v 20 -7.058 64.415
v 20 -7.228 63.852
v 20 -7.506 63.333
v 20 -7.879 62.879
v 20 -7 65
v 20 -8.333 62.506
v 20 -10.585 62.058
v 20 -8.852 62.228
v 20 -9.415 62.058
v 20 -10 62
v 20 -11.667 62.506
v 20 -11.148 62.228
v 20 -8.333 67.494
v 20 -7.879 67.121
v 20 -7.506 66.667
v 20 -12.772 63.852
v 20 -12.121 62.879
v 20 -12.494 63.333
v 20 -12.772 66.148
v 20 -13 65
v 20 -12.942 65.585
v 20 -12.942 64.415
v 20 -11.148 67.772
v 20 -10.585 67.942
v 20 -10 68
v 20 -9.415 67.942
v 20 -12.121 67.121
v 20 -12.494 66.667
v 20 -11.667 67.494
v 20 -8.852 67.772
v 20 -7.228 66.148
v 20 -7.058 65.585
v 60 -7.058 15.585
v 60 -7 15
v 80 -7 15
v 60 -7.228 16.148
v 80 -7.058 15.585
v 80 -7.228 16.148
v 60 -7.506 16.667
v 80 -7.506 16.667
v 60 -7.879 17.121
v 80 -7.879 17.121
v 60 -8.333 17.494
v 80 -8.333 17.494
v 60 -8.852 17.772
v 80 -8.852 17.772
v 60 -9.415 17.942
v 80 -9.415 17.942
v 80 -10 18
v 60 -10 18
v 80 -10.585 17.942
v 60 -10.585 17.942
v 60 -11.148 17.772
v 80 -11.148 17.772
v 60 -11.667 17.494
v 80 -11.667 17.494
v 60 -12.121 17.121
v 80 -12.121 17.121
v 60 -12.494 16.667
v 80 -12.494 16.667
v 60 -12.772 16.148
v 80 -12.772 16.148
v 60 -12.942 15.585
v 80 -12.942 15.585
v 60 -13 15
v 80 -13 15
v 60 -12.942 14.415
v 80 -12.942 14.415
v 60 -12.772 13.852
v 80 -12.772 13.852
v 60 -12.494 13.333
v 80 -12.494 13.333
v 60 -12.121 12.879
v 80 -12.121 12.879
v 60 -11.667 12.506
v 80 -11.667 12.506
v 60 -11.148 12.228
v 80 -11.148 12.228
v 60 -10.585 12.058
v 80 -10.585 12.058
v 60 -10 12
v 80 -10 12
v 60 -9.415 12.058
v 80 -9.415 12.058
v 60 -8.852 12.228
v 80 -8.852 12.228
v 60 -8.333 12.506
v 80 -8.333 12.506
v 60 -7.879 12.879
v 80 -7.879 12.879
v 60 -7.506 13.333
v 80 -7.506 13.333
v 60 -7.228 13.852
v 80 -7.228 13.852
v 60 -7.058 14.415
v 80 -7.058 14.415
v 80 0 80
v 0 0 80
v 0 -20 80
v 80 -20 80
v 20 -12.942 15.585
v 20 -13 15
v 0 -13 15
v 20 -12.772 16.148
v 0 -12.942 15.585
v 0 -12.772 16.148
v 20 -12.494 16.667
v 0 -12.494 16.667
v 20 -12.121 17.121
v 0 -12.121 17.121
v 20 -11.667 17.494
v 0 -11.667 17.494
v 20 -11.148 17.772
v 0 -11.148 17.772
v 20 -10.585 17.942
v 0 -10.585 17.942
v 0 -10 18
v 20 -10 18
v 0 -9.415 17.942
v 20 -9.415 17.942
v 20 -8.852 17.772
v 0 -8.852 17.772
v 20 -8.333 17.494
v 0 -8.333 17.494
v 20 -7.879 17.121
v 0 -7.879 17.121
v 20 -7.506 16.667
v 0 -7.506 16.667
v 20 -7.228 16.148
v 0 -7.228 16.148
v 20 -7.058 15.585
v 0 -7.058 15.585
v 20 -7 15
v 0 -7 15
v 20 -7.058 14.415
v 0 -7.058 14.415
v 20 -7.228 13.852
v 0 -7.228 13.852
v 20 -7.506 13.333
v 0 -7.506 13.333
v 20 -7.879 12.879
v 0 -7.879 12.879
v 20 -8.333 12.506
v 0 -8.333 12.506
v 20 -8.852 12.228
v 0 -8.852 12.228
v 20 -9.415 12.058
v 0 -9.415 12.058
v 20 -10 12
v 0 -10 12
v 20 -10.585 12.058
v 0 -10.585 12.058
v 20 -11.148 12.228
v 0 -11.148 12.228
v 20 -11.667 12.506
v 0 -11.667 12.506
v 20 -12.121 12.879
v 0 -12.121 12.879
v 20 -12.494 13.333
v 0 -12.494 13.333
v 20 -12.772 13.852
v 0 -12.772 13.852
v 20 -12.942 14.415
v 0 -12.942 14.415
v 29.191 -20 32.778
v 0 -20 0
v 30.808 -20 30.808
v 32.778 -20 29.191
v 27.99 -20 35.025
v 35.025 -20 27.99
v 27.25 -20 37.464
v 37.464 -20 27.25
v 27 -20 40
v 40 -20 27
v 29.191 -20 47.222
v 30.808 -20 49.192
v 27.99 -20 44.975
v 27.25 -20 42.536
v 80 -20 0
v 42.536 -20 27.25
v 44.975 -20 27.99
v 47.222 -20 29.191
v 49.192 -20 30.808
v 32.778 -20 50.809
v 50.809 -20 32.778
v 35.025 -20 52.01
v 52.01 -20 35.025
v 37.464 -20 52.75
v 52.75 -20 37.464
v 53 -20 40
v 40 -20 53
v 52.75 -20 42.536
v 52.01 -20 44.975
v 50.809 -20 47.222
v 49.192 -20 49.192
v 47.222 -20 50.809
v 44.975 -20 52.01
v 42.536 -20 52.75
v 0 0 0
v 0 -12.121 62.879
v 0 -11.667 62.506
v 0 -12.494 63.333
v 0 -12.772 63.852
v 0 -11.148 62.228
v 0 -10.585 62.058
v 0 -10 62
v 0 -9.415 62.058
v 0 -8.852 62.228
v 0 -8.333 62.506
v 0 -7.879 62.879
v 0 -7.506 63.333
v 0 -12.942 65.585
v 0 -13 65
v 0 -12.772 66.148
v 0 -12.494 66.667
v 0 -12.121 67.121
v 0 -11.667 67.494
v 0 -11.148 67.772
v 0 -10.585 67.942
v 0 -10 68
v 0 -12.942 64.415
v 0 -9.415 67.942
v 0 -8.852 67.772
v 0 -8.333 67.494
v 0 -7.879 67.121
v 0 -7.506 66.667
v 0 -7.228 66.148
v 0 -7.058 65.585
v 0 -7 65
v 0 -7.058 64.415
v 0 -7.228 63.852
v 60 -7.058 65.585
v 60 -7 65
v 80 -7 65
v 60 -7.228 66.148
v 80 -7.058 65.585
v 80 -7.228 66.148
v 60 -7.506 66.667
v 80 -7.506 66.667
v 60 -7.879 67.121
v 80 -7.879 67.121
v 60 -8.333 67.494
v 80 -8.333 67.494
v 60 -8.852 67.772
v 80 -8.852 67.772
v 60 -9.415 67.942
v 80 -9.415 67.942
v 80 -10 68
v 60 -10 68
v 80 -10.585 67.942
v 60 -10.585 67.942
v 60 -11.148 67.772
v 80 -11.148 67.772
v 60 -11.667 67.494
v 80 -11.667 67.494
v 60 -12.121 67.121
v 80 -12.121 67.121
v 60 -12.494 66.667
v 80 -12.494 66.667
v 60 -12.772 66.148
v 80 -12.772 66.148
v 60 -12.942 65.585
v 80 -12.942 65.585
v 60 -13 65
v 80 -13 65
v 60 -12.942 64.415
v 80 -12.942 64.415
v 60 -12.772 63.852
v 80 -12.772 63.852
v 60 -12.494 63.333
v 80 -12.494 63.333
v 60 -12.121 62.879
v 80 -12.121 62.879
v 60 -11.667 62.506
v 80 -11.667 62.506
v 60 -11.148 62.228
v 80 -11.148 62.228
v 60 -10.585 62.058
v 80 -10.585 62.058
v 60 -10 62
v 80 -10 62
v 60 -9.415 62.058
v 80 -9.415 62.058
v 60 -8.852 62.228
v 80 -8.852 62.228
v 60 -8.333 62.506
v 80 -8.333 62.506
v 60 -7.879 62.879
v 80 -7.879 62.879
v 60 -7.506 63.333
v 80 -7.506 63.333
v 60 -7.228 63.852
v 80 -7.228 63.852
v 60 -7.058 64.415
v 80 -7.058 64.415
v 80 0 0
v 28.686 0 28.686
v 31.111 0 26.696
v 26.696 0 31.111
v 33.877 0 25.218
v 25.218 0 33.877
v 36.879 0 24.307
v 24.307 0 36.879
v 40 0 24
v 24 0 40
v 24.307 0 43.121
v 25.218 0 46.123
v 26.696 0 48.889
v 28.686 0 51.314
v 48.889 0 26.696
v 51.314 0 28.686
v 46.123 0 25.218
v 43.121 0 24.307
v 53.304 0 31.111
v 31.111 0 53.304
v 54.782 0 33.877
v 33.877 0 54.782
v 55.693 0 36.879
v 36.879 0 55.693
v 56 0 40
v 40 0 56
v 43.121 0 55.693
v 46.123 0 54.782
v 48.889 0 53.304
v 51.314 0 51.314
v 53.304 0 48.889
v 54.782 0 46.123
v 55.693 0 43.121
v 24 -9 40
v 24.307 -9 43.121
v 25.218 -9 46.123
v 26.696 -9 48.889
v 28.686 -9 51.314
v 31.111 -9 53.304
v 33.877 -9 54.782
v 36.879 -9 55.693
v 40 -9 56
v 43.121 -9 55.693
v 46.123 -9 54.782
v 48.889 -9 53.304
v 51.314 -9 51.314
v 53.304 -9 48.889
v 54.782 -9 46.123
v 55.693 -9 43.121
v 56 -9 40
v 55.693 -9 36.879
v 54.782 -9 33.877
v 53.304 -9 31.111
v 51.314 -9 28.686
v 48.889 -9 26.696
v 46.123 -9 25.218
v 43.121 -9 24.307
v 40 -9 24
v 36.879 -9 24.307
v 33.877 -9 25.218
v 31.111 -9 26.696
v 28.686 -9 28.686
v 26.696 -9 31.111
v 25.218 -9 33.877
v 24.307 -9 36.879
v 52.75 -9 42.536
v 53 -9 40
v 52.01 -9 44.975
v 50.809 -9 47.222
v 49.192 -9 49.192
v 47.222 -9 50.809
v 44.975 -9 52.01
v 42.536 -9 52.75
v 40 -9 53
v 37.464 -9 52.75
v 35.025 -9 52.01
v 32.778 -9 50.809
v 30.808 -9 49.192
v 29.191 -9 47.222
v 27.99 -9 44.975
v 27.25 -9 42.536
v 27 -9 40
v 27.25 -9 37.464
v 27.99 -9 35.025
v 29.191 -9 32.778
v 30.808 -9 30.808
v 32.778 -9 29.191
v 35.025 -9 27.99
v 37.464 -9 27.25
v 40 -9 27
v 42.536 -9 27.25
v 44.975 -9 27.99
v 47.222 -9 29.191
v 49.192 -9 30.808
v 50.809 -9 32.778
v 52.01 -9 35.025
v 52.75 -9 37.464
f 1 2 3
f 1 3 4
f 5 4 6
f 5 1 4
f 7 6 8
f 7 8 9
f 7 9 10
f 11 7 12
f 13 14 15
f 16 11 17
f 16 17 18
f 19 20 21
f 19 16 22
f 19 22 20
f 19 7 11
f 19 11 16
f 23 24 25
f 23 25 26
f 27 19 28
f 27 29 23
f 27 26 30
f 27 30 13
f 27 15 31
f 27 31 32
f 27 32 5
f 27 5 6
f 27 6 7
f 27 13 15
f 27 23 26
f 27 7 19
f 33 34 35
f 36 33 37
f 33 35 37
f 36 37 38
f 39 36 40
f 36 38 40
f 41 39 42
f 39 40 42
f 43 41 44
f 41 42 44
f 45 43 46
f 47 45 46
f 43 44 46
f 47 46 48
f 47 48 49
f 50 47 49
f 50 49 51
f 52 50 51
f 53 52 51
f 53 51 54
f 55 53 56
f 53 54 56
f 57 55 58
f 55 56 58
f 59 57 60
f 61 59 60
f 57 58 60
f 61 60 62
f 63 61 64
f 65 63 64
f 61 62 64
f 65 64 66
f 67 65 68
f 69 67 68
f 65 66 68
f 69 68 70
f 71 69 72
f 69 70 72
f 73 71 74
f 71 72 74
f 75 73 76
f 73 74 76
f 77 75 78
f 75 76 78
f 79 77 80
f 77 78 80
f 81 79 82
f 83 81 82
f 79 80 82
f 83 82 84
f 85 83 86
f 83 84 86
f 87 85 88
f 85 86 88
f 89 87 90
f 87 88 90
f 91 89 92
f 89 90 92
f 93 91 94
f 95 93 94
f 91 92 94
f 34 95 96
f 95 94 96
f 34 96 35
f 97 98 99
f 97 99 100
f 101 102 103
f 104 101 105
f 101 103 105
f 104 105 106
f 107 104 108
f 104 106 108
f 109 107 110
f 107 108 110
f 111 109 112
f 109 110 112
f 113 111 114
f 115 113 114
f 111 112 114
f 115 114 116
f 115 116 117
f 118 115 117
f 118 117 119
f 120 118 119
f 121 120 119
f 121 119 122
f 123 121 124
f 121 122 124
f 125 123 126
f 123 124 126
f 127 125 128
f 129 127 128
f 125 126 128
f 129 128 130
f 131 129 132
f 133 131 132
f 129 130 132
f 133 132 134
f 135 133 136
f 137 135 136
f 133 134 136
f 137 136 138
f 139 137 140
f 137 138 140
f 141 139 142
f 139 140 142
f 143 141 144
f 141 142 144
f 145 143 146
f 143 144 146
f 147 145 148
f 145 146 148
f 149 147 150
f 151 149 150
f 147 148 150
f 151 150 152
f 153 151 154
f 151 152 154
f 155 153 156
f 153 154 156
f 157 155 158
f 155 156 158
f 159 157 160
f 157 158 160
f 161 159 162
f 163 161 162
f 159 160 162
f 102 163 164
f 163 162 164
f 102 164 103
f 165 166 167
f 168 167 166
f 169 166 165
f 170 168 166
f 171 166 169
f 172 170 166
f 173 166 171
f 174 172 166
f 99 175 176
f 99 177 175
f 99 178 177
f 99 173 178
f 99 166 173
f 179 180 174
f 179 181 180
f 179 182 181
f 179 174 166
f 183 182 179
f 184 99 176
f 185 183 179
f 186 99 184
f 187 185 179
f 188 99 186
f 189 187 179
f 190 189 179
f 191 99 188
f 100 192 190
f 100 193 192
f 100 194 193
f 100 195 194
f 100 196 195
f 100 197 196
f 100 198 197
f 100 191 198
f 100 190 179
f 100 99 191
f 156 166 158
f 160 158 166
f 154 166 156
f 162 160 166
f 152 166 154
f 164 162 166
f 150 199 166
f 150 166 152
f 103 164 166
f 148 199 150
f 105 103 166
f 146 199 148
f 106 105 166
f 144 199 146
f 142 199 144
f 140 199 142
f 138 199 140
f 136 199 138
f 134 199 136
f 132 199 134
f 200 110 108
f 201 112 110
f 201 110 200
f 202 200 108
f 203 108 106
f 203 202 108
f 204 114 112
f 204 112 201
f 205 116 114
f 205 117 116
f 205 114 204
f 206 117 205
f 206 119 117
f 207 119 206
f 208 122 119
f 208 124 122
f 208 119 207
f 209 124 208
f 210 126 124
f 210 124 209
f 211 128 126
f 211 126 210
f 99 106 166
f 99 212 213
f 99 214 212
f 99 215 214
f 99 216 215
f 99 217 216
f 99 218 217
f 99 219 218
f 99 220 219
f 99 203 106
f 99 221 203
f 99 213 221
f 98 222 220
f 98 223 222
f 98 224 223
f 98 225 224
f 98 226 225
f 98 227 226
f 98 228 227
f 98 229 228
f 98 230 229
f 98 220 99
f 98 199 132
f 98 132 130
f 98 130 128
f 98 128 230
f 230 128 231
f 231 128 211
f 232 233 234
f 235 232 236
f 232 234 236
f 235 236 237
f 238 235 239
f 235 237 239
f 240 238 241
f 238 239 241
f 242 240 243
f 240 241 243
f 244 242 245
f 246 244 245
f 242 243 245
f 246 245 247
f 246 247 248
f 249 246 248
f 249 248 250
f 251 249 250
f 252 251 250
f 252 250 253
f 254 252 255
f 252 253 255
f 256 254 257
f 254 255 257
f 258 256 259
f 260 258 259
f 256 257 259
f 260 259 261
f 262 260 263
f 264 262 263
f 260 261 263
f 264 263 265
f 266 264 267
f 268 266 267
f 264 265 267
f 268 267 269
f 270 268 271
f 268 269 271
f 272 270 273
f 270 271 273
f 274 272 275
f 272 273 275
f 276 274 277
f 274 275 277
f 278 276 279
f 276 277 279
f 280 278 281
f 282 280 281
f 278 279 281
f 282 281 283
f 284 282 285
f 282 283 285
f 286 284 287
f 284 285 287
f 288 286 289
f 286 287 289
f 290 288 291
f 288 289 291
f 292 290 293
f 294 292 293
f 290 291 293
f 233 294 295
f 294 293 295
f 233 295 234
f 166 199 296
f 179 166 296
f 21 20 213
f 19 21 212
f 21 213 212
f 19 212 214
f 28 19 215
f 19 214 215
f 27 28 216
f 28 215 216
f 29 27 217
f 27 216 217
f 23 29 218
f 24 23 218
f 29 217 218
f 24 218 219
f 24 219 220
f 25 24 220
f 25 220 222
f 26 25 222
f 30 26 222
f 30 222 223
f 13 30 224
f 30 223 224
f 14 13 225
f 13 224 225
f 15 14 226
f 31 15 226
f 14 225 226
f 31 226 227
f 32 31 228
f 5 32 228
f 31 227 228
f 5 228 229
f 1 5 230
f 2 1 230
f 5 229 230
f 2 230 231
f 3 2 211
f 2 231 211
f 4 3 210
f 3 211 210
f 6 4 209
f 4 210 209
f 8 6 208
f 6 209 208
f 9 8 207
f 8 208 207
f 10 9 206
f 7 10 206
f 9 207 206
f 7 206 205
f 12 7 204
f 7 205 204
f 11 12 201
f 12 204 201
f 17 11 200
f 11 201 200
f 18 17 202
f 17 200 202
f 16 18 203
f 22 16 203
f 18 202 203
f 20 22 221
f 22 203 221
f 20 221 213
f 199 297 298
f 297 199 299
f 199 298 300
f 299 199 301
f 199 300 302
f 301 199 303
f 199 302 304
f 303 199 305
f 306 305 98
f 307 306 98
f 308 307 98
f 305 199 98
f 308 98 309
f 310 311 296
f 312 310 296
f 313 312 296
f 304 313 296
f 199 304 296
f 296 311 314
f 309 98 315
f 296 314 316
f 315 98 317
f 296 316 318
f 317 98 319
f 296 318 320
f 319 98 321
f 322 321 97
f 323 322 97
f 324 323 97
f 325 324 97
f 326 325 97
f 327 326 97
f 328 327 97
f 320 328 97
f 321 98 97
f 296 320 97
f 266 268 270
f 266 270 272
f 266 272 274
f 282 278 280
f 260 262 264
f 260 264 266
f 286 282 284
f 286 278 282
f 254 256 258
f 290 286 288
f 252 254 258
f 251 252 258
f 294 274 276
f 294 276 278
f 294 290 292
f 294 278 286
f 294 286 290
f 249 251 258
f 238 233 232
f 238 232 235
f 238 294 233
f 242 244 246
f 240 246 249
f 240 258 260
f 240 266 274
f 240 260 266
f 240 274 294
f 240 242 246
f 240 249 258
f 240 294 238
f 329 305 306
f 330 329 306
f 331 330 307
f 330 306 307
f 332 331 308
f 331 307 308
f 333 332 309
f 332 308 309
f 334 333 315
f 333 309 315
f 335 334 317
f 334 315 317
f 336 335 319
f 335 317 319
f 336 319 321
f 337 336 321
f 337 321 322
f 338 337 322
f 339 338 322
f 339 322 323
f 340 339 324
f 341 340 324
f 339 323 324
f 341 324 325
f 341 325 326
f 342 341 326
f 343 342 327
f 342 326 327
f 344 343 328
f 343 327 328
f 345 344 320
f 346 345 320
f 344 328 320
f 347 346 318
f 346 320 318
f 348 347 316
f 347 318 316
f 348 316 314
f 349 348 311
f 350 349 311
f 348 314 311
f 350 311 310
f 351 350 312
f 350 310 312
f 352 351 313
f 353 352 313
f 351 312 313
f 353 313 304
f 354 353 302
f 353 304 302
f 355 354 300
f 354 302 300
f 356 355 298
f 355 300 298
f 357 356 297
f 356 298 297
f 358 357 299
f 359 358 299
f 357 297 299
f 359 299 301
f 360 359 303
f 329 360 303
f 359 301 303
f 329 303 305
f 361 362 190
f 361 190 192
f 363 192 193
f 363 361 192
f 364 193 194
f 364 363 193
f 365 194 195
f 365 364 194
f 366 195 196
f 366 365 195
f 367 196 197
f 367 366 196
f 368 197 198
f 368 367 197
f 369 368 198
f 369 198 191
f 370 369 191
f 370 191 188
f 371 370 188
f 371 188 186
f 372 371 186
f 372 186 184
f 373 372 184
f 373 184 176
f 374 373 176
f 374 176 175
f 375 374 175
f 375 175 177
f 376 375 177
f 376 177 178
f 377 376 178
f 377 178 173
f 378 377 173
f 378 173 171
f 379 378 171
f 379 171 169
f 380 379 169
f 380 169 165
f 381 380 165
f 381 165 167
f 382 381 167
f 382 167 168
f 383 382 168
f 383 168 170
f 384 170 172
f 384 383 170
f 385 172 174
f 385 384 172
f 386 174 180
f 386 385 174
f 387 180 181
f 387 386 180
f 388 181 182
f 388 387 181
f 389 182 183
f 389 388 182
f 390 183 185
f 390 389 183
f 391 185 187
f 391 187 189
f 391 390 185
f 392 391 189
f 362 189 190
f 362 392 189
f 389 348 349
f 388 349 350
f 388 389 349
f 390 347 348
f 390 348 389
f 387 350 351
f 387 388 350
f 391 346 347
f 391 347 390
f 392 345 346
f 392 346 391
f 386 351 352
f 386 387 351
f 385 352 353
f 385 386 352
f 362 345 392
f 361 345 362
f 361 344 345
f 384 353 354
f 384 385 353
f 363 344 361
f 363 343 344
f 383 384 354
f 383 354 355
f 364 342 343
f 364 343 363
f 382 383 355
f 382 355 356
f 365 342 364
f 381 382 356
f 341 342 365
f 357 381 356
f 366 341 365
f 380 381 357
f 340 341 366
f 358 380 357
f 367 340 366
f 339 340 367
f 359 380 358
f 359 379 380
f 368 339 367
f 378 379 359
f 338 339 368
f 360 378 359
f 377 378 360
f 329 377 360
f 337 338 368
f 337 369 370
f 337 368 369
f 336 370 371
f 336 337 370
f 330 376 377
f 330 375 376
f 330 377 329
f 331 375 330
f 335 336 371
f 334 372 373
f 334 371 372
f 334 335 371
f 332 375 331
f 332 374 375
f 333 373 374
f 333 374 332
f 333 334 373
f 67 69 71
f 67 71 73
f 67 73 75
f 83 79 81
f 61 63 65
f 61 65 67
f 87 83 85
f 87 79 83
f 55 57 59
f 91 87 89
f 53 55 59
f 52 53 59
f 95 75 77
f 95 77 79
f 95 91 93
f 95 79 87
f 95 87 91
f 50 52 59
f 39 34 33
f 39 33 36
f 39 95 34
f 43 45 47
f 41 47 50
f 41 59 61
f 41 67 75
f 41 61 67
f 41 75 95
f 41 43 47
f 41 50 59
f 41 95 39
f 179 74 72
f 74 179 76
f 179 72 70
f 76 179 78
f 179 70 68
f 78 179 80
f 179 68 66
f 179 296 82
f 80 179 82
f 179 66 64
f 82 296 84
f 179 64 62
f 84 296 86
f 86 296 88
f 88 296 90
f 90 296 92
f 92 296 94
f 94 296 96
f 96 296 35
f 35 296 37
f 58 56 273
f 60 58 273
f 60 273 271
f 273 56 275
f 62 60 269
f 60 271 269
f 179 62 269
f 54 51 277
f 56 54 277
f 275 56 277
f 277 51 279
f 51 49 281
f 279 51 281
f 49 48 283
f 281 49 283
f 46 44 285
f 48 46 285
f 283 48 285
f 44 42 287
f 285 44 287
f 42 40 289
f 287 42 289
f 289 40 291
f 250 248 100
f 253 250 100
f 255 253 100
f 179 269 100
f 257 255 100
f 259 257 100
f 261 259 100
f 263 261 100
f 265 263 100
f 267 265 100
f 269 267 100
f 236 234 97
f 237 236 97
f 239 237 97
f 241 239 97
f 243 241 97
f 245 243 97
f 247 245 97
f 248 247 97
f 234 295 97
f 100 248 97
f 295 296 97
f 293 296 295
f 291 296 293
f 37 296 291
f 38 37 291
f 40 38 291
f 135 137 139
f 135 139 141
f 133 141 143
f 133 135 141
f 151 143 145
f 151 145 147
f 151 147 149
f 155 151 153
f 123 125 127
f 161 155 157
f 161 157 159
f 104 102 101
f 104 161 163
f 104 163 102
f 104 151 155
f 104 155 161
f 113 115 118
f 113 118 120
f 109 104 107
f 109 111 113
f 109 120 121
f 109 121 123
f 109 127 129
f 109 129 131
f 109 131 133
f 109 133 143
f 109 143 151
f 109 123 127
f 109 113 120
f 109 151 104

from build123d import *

# Parameters (mm, degrees)
F0_W     = 80
F0_H     = 80
F0_R     = 13
F1_DEPTH = 20
F2_R     = 16
F2_R_2   = 13
F3_DEPTH = 9
F4_R     = 3
F5_DEPTH = 20
F6_R     = 3
F7_DEPTH = 20


with BuildPart() as f1:
    # F0 (on Front) → F1 (new body)
    with BuildSketch(Plane.XZ):
        with Locations((40, 40)):
            Rectangle(F0_W, F0_H)
        with Locations((40, 40)):
            Circle(F0_R, mode=Mode.SUBTRACT)
    extrude(amount=F1_DEPTH)

    # F2 (on face) → F3 (cut)
    with BuildSketch(Plane(origin=(0, 0, 0), x_dir=(-1, 0, 0), z_dir=(0, 1, 0))):
        with Locations((-40, 40)):
            Circle(F2_R)
        with Locations((-40, 40)):
            Circle(F2_R_2, mode=Mode.SUBTRACT)
    extrude(amount=-F3_DEPTH, mode=Mode.SUBTRACT)

    # F4 (on face) → F5 (cut)
    with BuildSketch(Plane.YZ.offset(80)):
        with Locations((-10, 65)):
            Circle(F4_R)
        with Locations((-10, 15)):
            Circle(F4_R)
    extrude(amount=-F5_DEPTH, mode=Mode.SUBTRACT)

    # F6 (on face) → F7 (cut)
    with BuildSketch(Plane(origin=(0, 0, 0), x_dir=(0, -1, 0), z_dir=(-1, 0, 0))):
        with Locations((10, 65)):
            Circle(F6_R)
        with Locations((10, 15)):
            Circle(F6_R)
    extrude(amount=-F7_DEPTH, mode=Mode.SUBTRACT)


solid = f1.part
